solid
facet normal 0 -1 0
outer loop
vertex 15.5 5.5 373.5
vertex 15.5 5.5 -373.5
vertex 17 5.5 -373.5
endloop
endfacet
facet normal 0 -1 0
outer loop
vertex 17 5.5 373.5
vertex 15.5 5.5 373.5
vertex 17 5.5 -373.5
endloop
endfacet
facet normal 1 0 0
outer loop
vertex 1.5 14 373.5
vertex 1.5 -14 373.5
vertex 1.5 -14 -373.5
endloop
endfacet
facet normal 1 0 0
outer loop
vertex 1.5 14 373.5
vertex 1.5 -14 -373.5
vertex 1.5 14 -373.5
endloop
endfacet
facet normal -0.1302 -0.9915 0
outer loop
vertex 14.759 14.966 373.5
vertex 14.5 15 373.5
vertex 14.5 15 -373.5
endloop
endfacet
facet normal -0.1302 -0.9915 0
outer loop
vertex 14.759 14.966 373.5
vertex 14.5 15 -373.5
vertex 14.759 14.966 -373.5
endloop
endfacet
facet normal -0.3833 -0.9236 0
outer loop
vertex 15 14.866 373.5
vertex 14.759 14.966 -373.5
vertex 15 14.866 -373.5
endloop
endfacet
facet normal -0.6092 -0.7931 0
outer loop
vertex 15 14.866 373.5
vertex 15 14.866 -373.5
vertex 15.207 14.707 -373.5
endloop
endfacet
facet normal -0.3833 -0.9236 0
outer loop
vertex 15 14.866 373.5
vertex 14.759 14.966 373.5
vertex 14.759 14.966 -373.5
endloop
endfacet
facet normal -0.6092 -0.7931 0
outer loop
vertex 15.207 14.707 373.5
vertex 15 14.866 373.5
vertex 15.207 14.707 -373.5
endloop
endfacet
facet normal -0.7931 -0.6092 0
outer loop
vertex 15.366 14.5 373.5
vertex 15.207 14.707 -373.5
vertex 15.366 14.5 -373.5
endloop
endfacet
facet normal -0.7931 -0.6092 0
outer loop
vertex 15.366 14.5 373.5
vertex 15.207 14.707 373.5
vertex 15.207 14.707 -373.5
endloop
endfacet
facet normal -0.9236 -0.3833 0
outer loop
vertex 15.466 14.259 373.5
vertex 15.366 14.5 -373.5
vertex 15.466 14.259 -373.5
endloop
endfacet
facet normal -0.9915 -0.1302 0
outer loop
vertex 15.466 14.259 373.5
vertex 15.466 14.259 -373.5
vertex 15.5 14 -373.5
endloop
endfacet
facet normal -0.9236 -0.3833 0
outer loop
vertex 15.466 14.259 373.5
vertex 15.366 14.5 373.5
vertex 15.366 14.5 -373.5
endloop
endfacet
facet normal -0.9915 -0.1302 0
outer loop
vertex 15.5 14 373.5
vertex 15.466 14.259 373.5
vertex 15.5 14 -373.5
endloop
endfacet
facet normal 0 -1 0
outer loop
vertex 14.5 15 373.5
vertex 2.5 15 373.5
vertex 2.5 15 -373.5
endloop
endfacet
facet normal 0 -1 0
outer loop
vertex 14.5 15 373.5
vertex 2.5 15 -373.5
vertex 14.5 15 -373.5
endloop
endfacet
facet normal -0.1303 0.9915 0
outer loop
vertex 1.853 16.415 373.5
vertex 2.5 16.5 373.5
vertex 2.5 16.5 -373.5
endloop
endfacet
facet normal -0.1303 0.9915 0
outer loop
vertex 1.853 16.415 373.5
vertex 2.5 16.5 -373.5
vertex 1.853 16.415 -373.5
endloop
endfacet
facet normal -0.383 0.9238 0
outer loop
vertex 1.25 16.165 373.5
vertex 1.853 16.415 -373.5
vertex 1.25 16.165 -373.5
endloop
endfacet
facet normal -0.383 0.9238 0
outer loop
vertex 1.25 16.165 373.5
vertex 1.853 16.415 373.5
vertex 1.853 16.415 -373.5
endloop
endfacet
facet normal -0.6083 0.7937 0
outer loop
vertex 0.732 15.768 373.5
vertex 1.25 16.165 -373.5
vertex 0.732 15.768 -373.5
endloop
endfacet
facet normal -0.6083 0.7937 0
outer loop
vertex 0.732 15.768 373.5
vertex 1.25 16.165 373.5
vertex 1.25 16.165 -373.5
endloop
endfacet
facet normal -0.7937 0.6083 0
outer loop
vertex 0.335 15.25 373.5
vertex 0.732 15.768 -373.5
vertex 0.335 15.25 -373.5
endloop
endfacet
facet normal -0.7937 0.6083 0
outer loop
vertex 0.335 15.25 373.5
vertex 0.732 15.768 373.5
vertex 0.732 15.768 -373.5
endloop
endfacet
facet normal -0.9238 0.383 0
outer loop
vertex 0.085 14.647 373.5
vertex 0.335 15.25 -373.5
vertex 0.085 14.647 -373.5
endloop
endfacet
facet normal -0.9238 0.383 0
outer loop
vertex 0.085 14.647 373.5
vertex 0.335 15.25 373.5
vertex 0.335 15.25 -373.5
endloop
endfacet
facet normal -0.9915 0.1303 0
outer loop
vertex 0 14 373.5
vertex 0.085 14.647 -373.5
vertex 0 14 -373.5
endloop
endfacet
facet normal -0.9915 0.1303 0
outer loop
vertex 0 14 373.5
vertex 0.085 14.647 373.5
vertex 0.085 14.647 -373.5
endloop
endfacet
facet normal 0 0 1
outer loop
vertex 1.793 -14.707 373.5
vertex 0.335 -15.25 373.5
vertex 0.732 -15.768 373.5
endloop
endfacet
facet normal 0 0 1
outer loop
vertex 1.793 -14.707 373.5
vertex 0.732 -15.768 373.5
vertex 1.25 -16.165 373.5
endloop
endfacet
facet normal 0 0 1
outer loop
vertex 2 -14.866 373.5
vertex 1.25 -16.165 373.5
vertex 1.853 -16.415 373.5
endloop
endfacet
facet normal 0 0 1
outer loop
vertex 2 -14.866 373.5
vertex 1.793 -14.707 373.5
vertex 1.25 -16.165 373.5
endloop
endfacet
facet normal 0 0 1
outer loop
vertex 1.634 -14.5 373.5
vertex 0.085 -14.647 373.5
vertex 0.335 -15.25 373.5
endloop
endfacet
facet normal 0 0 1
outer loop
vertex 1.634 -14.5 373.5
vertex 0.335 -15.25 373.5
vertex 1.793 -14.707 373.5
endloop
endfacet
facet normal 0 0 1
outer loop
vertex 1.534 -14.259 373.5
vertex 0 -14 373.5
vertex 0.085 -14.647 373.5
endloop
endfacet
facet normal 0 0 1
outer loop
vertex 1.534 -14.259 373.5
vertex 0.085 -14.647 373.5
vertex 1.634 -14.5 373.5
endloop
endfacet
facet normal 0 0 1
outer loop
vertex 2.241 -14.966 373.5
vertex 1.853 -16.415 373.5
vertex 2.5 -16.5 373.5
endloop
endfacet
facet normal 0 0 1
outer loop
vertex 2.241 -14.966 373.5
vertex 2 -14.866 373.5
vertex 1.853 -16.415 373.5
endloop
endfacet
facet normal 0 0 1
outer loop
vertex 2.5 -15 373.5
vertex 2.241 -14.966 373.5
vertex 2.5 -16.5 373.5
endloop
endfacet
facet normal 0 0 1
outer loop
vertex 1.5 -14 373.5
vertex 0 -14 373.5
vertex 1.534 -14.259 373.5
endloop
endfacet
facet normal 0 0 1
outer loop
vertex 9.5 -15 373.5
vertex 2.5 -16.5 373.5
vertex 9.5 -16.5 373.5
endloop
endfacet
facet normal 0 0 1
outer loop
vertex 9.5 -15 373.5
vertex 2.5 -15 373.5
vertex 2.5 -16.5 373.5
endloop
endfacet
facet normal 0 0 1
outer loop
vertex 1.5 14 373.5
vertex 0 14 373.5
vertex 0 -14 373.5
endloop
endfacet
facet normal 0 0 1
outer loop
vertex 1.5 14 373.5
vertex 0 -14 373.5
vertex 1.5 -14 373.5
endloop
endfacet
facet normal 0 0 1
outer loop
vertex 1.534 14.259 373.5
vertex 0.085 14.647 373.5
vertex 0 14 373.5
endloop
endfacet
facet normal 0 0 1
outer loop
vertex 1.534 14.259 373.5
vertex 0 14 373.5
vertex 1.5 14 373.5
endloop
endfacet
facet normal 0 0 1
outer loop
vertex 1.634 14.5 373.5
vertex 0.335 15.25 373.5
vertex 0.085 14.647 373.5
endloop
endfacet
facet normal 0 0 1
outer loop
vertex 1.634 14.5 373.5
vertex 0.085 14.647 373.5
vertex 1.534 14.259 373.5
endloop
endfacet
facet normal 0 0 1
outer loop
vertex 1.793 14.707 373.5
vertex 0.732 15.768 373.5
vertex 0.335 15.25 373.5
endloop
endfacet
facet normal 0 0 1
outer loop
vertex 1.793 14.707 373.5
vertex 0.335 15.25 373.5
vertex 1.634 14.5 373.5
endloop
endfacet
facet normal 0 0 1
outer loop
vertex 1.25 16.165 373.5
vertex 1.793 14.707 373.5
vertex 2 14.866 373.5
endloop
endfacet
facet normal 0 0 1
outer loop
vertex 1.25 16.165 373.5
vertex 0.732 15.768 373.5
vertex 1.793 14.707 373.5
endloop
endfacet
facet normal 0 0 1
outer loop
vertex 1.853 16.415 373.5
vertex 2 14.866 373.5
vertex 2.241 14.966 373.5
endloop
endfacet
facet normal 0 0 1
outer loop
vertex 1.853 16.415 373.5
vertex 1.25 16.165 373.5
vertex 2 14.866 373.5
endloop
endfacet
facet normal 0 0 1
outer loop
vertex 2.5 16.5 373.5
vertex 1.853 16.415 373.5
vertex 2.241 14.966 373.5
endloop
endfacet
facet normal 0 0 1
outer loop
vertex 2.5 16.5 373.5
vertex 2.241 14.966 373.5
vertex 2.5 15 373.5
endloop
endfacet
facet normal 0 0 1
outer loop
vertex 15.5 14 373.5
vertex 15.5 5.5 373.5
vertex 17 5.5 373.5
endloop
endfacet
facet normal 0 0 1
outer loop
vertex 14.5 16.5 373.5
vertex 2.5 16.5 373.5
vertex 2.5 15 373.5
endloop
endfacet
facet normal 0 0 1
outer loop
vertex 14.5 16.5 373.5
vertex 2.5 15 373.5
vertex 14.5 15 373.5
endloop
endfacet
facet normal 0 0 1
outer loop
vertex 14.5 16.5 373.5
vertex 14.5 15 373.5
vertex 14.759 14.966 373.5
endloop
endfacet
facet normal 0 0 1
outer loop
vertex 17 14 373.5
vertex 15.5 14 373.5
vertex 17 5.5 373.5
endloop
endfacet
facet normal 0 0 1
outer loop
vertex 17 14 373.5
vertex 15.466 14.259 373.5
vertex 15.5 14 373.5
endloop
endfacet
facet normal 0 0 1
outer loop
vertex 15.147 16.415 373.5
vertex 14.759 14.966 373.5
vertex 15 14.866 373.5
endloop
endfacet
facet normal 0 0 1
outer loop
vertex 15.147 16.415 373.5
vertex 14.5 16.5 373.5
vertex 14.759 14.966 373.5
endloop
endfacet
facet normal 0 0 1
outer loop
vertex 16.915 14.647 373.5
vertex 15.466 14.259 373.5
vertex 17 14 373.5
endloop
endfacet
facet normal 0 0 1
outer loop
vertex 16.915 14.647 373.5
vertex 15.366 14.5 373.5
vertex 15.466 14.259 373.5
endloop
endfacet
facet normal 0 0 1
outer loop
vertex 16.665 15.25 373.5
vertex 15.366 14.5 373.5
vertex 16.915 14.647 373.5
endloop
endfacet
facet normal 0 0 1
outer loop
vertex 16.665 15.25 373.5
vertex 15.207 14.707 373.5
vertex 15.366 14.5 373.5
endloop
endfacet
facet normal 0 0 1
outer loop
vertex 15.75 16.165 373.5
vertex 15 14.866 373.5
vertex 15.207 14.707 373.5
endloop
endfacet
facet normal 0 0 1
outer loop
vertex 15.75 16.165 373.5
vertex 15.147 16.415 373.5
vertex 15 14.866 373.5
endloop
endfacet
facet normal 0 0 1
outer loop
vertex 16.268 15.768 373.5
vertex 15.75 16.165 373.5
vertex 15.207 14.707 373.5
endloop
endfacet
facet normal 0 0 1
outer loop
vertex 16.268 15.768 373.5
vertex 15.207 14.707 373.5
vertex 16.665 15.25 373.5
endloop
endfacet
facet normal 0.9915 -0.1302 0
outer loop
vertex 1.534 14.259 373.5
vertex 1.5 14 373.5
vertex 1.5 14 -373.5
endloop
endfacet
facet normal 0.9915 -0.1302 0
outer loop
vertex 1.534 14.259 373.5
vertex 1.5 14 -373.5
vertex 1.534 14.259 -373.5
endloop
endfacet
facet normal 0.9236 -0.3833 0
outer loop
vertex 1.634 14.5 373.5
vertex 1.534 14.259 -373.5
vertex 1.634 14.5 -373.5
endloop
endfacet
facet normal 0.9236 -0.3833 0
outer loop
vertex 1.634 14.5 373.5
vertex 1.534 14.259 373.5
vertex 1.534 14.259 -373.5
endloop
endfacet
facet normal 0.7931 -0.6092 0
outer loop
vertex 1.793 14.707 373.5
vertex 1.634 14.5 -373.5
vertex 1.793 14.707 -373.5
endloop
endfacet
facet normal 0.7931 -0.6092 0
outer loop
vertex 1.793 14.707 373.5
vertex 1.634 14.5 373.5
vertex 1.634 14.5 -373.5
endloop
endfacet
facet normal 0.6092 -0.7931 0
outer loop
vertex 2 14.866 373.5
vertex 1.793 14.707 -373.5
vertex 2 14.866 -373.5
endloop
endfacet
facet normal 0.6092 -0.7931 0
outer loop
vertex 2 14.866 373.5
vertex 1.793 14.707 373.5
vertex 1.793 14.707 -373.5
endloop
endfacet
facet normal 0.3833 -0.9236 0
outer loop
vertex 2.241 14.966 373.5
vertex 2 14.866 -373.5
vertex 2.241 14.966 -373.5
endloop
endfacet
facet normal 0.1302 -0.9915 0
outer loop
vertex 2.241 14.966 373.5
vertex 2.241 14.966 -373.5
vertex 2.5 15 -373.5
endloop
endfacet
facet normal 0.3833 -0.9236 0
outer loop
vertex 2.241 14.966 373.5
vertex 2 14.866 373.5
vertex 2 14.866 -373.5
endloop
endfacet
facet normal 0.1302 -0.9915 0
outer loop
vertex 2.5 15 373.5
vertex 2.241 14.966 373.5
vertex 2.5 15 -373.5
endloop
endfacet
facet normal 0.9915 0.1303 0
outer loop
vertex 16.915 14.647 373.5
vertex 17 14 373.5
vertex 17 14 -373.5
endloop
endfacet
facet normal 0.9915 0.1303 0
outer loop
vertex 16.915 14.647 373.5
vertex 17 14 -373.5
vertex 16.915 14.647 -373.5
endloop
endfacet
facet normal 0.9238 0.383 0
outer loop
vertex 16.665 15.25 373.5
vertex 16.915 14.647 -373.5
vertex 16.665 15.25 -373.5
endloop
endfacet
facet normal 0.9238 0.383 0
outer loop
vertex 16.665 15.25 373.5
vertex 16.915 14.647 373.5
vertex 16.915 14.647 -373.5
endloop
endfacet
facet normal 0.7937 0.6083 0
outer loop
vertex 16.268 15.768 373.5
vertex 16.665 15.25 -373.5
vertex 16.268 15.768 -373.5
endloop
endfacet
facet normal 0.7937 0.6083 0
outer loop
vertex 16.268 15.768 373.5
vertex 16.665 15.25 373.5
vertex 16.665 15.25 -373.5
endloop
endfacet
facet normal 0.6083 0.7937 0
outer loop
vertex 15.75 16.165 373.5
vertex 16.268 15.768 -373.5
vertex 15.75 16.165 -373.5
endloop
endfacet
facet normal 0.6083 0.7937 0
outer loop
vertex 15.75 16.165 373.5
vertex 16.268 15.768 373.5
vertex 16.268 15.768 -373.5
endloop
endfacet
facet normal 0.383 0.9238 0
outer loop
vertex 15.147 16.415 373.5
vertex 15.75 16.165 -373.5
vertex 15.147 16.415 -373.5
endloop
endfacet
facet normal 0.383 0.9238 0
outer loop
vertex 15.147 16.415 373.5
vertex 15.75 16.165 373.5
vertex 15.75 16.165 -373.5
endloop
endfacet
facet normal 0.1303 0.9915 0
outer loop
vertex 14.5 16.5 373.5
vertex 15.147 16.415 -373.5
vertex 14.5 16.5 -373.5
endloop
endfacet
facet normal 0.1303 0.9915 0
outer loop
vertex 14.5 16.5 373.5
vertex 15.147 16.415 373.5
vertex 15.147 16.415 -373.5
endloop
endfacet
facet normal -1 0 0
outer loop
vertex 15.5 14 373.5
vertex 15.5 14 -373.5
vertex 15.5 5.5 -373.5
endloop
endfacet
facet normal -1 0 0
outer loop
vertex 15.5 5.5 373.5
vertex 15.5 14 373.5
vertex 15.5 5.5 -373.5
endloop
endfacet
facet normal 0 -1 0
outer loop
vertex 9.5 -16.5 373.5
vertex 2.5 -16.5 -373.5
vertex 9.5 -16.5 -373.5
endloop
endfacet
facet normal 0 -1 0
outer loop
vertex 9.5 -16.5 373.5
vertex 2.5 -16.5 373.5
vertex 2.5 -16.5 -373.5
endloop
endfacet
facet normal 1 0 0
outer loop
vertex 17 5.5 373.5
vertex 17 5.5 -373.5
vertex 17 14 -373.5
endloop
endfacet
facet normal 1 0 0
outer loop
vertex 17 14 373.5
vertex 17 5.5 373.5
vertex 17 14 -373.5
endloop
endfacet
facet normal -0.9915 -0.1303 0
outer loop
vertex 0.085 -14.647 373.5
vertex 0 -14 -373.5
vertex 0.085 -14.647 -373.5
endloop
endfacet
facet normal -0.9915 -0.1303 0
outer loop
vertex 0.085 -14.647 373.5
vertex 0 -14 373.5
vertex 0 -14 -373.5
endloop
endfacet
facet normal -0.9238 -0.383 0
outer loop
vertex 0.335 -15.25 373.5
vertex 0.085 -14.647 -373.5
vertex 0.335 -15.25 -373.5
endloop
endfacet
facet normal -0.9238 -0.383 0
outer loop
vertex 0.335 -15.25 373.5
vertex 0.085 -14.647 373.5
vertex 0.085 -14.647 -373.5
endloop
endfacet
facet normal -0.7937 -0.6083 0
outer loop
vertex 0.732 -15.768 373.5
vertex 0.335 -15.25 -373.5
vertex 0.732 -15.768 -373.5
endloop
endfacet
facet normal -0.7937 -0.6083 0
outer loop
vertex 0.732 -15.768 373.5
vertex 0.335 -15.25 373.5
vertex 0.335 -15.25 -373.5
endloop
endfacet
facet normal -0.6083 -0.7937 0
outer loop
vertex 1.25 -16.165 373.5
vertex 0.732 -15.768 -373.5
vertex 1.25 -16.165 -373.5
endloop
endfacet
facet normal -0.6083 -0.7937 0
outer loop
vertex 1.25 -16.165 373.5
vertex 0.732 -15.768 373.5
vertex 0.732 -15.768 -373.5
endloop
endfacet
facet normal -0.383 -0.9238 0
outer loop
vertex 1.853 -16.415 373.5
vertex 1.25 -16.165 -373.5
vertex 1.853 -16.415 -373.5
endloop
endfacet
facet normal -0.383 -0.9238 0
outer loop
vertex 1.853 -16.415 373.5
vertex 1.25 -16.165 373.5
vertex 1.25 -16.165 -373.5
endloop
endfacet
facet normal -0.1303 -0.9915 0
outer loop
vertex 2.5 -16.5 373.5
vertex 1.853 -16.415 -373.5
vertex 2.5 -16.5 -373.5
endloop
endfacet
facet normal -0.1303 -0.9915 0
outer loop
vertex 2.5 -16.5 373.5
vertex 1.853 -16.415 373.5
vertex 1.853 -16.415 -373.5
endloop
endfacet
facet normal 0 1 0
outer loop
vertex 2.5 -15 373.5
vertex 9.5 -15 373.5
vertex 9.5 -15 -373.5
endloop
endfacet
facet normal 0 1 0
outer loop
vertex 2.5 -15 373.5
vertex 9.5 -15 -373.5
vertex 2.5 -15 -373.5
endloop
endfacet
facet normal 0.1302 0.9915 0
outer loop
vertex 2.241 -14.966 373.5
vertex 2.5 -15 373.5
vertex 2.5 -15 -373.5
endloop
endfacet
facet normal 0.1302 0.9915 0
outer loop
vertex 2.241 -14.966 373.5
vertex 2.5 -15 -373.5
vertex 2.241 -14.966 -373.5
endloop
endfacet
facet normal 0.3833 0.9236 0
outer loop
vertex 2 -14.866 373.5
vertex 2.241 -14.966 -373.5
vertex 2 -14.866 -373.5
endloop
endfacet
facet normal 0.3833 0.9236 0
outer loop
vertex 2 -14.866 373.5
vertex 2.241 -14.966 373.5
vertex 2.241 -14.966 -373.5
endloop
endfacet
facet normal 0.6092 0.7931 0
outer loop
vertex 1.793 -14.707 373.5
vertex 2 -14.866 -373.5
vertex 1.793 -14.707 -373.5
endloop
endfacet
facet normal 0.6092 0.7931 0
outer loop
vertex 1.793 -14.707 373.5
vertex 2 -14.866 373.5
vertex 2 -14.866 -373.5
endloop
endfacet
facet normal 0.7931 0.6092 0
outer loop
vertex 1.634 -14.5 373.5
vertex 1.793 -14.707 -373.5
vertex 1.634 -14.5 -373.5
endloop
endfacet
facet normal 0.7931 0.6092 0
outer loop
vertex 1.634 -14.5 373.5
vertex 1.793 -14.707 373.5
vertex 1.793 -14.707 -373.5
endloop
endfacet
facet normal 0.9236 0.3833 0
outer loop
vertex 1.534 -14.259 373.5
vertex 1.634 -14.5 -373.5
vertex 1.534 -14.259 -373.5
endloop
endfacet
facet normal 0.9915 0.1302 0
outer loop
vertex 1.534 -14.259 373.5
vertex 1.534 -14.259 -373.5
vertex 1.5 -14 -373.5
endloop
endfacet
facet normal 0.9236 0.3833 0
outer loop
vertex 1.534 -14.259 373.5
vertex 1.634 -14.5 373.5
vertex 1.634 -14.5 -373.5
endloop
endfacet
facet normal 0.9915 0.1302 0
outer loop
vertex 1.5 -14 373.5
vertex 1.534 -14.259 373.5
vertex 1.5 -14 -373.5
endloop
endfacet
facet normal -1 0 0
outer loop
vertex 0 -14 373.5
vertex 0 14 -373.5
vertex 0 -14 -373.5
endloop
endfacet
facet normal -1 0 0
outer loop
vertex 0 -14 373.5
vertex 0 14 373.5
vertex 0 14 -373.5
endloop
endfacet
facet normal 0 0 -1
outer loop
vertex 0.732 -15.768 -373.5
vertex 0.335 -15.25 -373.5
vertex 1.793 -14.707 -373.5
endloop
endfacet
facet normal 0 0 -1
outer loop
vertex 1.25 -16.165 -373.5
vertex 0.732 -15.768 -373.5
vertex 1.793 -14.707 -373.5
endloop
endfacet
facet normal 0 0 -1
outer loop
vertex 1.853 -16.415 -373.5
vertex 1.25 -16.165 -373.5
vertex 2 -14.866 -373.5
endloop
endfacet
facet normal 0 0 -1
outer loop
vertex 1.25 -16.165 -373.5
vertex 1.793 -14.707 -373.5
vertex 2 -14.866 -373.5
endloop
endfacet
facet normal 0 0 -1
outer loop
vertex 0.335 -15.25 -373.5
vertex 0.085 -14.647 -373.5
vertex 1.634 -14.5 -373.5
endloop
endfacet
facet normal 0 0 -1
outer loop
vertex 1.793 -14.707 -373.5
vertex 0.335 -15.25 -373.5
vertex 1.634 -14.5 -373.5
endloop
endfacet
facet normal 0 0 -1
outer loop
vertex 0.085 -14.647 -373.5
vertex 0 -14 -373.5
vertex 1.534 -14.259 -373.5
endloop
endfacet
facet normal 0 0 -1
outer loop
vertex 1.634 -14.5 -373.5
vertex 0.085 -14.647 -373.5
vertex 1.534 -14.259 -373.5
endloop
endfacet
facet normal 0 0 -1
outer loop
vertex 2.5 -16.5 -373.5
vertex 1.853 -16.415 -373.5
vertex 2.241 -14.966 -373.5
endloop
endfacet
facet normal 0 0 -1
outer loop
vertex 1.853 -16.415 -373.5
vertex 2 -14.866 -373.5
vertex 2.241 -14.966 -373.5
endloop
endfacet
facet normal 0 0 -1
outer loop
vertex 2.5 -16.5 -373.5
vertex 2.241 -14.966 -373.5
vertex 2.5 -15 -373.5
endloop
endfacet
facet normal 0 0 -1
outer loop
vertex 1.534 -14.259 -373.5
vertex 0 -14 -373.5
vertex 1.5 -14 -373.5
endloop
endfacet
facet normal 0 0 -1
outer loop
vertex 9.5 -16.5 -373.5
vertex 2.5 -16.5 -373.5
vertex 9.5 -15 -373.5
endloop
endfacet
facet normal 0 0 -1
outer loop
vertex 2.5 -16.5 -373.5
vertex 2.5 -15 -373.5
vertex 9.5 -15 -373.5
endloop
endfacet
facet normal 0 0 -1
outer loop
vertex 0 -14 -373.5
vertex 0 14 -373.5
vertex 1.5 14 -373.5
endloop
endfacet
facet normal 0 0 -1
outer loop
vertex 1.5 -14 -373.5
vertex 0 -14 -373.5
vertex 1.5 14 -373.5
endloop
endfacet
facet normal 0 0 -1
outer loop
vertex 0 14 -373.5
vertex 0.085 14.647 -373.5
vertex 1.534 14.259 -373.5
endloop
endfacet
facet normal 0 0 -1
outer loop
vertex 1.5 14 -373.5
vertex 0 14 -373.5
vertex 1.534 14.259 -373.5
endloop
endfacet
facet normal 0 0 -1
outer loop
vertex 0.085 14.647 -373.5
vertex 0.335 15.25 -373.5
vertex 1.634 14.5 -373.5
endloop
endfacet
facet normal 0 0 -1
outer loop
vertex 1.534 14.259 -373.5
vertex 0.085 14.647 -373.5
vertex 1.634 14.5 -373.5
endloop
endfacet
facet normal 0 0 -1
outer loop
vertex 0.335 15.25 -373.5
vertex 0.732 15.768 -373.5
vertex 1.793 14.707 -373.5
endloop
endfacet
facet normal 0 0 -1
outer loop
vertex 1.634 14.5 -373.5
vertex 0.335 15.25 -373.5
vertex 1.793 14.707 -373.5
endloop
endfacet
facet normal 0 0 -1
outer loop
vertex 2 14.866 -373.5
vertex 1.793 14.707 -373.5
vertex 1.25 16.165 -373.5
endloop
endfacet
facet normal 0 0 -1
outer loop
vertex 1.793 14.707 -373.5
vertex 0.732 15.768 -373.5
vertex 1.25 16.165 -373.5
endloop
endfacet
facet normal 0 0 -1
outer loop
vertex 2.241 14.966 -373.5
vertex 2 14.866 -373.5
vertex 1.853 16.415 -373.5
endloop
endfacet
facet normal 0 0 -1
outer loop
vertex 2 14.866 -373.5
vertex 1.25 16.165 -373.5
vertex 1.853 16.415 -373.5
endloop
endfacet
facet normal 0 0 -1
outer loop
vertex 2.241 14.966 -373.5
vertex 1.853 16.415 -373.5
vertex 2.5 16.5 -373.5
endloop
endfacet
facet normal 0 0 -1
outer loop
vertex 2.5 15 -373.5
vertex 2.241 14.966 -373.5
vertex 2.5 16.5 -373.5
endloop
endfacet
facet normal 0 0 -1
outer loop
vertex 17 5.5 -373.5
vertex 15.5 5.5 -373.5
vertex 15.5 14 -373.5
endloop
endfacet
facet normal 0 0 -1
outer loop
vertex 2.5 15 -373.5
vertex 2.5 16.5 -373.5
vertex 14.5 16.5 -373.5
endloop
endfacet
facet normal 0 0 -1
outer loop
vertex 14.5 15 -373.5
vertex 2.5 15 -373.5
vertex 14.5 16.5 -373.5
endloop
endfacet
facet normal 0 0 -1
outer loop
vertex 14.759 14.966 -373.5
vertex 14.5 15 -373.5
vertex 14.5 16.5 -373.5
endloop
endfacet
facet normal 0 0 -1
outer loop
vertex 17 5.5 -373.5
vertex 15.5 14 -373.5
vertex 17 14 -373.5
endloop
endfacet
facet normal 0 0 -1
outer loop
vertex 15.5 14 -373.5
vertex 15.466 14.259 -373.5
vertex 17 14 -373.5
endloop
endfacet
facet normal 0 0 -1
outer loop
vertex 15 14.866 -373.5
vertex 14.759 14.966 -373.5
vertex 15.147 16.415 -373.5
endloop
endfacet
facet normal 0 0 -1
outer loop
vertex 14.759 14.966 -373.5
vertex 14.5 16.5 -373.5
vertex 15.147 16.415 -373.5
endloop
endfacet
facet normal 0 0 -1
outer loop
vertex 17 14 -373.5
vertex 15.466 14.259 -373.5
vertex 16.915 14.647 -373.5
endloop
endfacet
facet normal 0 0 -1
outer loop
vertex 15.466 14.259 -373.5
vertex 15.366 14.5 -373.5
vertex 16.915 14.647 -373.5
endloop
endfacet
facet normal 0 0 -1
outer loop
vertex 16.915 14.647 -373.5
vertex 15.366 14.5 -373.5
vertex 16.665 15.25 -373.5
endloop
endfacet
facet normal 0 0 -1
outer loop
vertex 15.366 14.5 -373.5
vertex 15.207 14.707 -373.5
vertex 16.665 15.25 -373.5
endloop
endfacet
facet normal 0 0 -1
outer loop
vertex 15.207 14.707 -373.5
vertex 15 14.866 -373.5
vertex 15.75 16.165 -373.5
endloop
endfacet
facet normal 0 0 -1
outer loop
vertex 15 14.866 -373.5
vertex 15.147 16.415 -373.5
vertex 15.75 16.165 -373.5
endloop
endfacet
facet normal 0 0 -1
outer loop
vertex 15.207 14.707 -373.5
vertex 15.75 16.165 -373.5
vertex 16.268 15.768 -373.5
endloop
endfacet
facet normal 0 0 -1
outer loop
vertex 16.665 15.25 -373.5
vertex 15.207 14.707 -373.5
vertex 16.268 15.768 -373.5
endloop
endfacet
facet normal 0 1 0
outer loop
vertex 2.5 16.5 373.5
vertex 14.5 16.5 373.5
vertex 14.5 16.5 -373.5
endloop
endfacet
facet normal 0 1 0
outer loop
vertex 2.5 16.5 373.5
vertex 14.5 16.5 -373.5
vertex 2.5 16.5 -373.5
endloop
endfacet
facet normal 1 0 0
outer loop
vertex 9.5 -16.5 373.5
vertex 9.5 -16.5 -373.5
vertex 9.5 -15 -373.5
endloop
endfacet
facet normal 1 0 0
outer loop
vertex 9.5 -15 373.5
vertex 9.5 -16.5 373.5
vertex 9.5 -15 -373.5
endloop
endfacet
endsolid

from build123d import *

# Parameters (mm, degrees)
F1_DEPTH = 373.5


with BuildPart() as f1:
    # F0 (on Top) → F1 (new body, symmetric)
    with BuildSketch(Plane.XY):
        with BuildLine():
            Line((2.5, -16.5), (9.5, -16.5))
            Line((9.5, -16.5), (9.5, -15))
            Line((9.5, -15), (2.5, -15))
            ThreePointArc((2.5, -15), (1.792893, -14.707107), (1.5, -14))
            Line((1.5, -14), (1.5, 14))
            ThreePointArc((1.5, 14), (1.792893, 14.707107), (2.5, 15))
            Line((2.5, 15), (14.5, 15))
            ThreePointArc((14.5, 15), (15.207107, 14.707107), (15.5, 14))
            Line((15.5, 14), (15.5, 5.5))
            Line((15.5, 5.5), (17, 5.5))
            Line((17, 5.5), (17, 14))
            ThreePointArc((17, 14), (16.267767, 15.767767), (14.5, 16.5))
            Line((14.5, 16.5), (2.5, 16.5))
            ThreePointArc((2.5, 16.5), (0.732233, 15.767767), (0, 14))
            Line((0, 14), (0, -14))
            ThreePointArc((0, -14), (0.732233, -15.767767), (2.5, -16.5))
        make_face()
    extrude(amount=F1_DEPTH, both=True)


solid = f1.part
